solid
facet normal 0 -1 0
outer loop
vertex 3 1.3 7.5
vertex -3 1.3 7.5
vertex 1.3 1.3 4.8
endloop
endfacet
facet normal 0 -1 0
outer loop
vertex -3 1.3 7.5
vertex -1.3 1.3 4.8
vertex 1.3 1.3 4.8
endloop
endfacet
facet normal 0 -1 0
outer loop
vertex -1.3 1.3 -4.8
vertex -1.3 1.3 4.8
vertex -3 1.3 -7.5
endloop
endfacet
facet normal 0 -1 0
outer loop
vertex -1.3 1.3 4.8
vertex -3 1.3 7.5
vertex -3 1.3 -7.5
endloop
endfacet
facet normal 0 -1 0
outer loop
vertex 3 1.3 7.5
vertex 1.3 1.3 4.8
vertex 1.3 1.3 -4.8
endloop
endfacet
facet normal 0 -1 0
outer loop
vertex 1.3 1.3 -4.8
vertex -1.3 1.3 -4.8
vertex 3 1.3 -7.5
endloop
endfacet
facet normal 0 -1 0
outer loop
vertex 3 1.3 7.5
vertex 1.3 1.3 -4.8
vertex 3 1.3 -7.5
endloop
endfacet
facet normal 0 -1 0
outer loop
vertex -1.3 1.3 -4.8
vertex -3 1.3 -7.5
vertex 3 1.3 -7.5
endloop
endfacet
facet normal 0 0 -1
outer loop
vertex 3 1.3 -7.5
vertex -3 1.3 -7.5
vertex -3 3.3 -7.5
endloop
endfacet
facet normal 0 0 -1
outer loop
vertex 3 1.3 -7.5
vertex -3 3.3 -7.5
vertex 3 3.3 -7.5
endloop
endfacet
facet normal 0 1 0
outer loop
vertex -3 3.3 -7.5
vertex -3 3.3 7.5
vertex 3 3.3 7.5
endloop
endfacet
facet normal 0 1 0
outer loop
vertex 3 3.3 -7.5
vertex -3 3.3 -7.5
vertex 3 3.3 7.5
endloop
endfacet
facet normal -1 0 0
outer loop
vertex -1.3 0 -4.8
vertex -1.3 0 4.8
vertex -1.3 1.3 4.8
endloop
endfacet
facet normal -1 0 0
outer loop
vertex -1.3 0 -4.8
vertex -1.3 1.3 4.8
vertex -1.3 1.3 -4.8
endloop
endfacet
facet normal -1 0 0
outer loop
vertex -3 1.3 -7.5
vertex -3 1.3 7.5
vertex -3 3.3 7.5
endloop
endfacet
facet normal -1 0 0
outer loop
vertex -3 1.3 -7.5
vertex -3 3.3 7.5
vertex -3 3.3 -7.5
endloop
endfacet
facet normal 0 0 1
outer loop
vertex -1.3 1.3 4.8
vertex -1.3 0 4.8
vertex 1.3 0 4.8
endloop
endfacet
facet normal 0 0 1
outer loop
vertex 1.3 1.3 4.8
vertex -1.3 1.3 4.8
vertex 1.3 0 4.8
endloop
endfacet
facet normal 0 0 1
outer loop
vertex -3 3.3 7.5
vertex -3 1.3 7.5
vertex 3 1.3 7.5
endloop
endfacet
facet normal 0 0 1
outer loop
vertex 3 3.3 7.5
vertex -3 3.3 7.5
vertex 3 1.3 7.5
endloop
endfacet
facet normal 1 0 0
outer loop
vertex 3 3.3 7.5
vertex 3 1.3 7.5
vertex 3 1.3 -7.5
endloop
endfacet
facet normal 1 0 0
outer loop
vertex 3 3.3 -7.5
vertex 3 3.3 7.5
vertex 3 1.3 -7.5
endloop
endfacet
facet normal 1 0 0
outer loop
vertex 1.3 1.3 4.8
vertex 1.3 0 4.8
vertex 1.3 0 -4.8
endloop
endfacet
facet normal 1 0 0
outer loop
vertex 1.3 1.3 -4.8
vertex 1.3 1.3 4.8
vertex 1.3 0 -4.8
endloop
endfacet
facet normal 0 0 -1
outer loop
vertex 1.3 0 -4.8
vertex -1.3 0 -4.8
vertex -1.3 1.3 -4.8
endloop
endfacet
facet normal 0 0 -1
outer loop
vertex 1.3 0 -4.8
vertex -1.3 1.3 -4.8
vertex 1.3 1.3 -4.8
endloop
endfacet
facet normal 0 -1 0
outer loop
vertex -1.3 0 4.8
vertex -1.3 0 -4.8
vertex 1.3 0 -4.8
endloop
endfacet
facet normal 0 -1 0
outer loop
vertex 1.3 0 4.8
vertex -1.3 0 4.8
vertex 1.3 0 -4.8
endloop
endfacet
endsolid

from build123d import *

# Parameters (mm, degrees)
SKETCH_1_W      = 2.6
SKETCH_1_H      = 9.6
EXTRUDE_1_DEPTH = 1.3
EXTRUDE_START   = 1.3
SKETCH_1_3_W    = 6
SKETCH_1_3_H    = 15
SKETCH_1_3_W_2  = 2.6
SKETCH_1_3_H_2  = 9.6
EXTRUDE_2_DEPTH = 2


with BuildPart() as part:
    # 草图1 → 凸台-拉伸1 (new body)
    with BuildSketch(Plane(origin=(0, 0, 0), x_dir=(1, 0, 0), z_dir=(0, 1, 0))):
        Rectangle(SKETCH_1_W, SKETCH_1_H)
    extrude(amount=EXTRUDE_1_DEPTH)

    # 草图1<3> → 凸台-拉伸2 (add)
    # profile 1 of 2: a face of its own
    with BuildSketch(Plane(origin=(0, 0, 0), x_dir=(1, 0, 0), z_dir=(0, 1, 0)).offset(EXTRUDE_START)):
        Rectangle(SKETCH_1_3_W, SKETCH_1_3_H)
        Rectangle(SKETCH_1_3_W_2, SKETCH_1_3_H_2, mode=Mode.SUBTRACT)
    # profile 2 of 2: a face of its own
    with BuildSketch(Plane(origin=(0, 0, 0), x_dir=(1, 0, 0), z_dir=(0, 1, 0)).offset(EXTRUDE_START)):
        Rectangle(SKETCH_1_3_W_2, SKETCH_1_3_H_2)
    extrude(amount=EXTRUDE_2_DEPTH)


solid = part.part
